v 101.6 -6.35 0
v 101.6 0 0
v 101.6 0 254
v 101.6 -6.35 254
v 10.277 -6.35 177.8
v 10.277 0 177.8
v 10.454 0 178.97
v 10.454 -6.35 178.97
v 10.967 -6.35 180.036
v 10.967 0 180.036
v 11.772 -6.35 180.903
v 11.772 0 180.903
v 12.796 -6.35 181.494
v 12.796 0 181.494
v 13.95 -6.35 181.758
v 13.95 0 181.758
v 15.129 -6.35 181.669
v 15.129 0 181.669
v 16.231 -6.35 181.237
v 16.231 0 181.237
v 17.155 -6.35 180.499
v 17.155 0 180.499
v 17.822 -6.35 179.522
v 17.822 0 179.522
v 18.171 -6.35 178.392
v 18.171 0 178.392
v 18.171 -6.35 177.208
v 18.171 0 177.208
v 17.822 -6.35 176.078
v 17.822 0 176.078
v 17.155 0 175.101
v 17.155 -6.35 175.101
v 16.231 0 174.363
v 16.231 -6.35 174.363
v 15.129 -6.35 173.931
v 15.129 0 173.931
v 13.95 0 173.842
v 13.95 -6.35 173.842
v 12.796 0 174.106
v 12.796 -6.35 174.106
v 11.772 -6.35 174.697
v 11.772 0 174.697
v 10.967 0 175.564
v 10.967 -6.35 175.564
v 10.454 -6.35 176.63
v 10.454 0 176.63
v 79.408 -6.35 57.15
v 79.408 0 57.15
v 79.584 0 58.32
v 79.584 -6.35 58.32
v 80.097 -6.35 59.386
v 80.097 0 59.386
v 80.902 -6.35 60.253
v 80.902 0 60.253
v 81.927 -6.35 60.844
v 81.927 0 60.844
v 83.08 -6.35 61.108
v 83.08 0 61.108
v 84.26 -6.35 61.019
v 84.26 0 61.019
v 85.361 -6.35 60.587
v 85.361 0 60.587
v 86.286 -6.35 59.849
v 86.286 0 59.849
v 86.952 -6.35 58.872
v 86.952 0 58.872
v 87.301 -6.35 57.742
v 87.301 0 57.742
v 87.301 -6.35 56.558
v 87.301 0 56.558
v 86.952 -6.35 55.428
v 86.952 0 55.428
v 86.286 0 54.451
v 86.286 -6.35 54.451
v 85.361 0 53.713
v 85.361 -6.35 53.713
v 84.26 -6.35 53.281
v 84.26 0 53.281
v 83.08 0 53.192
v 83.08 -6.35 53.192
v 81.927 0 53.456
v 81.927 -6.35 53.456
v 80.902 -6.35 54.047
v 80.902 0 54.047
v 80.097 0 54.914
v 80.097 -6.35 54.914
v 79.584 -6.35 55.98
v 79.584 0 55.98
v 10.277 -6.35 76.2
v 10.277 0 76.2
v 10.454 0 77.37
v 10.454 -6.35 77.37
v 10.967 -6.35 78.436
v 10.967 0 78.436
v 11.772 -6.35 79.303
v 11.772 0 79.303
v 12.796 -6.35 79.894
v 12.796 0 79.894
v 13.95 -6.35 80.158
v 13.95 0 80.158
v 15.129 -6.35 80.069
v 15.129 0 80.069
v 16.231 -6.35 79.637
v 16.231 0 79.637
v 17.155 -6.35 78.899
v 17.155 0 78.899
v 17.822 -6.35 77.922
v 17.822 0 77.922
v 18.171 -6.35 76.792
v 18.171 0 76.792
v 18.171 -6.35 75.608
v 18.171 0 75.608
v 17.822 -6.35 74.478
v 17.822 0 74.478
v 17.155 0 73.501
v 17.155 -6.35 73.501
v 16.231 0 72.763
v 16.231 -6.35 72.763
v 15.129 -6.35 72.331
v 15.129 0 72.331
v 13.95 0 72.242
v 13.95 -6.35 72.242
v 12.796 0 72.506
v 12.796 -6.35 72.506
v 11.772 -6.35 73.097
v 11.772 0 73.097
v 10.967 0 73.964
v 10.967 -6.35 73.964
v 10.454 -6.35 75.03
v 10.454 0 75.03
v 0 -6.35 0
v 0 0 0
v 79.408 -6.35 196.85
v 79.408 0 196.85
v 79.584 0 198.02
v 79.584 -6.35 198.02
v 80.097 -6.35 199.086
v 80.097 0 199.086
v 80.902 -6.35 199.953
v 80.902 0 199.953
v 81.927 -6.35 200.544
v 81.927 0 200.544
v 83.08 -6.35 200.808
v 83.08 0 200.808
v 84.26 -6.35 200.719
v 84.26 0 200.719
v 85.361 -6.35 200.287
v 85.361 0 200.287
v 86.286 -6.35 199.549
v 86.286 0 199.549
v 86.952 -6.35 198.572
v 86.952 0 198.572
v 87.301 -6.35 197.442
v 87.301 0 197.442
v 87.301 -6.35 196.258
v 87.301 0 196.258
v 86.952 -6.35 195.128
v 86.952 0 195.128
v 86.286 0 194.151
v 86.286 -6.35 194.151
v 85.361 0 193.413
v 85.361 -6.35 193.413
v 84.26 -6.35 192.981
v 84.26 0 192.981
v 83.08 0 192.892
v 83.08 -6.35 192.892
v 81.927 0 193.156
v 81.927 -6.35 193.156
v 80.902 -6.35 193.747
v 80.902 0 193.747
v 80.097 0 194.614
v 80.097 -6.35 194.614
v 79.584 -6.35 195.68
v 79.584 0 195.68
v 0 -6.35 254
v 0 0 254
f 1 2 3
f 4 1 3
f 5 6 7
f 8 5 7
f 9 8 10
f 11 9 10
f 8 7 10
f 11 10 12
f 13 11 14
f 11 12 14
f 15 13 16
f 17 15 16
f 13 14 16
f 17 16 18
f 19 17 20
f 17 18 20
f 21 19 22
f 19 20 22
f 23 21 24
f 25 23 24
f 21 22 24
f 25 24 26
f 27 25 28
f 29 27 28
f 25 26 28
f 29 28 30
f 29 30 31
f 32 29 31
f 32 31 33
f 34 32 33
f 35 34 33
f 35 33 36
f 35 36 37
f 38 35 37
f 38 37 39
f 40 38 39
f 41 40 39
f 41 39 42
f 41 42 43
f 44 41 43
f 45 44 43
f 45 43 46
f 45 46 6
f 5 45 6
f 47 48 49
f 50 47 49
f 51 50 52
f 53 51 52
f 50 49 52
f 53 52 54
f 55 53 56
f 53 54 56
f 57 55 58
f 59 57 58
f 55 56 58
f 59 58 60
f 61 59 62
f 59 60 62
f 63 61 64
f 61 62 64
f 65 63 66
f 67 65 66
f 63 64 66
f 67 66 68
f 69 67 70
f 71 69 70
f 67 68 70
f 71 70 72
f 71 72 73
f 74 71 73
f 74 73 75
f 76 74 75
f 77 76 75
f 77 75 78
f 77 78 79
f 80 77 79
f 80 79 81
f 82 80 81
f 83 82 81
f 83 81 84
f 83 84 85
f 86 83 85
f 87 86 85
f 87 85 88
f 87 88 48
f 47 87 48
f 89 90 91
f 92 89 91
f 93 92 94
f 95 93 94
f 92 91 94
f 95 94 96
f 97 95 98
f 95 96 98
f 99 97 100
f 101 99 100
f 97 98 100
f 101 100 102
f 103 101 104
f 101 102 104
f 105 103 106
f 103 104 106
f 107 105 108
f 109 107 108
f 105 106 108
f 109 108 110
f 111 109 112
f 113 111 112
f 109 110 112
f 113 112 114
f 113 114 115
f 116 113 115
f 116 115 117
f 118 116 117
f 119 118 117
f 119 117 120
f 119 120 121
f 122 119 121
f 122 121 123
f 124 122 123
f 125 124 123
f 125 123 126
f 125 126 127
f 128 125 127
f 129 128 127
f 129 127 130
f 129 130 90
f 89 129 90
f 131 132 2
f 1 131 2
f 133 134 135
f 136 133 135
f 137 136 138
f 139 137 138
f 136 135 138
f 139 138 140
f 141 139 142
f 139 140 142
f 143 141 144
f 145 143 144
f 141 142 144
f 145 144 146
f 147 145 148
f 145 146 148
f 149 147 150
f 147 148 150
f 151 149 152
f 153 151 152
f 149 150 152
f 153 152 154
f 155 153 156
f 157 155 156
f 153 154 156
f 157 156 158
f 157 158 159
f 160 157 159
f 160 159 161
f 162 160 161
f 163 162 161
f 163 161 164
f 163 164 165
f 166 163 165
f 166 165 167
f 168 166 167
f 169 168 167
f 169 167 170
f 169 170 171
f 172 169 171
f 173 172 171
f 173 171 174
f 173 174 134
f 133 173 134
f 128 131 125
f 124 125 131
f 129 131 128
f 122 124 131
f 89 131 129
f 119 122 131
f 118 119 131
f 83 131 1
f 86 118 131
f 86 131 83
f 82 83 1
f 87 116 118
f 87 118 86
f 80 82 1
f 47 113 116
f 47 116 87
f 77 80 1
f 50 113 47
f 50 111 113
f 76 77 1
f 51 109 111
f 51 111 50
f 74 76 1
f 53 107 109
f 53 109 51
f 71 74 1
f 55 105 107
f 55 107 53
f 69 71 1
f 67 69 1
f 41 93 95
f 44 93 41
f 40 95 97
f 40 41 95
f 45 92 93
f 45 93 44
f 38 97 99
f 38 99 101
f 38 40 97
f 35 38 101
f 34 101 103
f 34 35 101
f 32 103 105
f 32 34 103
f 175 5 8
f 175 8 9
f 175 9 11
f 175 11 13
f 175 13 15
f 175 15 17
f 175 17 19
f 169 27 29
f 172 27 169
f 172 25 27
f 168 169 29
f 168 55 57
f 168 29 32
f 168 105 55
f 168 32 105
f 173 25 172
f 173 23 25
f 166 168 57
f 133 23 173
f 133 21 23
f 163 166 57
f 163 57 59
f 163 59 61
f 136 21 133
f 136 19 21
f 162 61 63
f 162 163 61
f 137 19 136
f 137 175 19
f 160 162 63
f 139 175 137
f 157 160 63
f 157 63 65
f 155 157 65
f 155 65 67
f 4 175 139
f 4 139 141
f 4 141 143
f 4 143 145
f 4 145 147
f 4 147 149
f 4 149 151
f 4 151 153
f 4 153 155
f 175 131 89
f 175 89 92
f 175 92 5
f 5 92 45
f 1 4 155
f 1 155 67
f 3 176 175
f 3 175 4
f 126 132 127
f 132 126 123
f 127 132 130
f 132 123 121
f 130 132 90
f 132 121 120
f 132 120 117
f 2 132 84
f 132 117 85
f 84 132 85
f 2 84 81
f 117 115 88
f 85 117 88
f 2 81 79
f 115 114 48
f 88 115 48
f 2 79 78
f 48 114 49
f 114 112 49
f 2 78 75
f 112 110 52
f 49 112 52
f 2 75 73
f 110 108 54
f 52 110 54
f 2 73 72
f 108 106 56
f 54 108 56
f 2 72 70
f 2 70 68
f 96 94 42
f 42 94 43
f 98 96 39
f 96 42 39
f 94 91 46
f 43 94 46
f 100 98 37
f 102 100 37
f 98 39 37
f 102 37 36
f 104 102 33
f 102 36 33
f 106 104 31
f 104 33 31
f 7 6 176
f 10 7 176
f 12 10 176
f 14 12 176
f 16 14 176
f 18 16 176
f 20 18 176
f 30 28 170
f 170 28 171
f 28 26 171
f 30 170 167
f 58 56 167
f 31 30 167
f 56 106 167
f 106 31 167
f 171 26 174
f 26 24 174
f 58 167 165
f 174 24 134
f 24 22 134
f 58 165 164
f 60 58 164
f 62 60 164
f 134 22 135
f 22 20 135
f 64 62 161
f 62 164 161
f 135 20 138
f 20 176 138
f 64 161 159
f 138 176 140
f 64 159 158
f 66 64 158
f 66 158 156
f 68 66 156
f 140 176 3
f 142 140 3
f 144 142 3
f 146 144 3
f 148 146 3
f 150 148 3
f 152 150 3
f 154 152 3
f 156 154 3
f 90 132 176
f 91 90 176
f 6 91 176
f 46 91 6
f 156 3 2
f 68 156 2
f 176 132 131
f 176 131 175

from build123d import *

# Parameters (mm, degrees)
F0_W     = 101.6
F0_H     = 254
F1_DEPTH = 6.35
F3_D     = 7.9375
F5_D     = 7.9375


with BuildPart() as f1:
    # F0 (on Front) → F1 (new body)
    with BuildSketch(Plane.XZ):
        with Locations((50.8, 127)):
            Rectangle(F0_W, F0_H)
    extrude(amount=F1_DEPTH)

    # F3 (through all)
    with Locations(Plane.XZ.offset(6.35)):
        with Locations((83.376482, 57.15), (83.376482, 196.85)):
            Hole(F3_D / 2)

    # F5 (through all)
    with Locations(Plane.XZ.offset(6.35)):
        with Locations((14.246169, 76.2), (14.246169, 177.8)):
            Hole(F5_D / 2)


solid = f1.part
